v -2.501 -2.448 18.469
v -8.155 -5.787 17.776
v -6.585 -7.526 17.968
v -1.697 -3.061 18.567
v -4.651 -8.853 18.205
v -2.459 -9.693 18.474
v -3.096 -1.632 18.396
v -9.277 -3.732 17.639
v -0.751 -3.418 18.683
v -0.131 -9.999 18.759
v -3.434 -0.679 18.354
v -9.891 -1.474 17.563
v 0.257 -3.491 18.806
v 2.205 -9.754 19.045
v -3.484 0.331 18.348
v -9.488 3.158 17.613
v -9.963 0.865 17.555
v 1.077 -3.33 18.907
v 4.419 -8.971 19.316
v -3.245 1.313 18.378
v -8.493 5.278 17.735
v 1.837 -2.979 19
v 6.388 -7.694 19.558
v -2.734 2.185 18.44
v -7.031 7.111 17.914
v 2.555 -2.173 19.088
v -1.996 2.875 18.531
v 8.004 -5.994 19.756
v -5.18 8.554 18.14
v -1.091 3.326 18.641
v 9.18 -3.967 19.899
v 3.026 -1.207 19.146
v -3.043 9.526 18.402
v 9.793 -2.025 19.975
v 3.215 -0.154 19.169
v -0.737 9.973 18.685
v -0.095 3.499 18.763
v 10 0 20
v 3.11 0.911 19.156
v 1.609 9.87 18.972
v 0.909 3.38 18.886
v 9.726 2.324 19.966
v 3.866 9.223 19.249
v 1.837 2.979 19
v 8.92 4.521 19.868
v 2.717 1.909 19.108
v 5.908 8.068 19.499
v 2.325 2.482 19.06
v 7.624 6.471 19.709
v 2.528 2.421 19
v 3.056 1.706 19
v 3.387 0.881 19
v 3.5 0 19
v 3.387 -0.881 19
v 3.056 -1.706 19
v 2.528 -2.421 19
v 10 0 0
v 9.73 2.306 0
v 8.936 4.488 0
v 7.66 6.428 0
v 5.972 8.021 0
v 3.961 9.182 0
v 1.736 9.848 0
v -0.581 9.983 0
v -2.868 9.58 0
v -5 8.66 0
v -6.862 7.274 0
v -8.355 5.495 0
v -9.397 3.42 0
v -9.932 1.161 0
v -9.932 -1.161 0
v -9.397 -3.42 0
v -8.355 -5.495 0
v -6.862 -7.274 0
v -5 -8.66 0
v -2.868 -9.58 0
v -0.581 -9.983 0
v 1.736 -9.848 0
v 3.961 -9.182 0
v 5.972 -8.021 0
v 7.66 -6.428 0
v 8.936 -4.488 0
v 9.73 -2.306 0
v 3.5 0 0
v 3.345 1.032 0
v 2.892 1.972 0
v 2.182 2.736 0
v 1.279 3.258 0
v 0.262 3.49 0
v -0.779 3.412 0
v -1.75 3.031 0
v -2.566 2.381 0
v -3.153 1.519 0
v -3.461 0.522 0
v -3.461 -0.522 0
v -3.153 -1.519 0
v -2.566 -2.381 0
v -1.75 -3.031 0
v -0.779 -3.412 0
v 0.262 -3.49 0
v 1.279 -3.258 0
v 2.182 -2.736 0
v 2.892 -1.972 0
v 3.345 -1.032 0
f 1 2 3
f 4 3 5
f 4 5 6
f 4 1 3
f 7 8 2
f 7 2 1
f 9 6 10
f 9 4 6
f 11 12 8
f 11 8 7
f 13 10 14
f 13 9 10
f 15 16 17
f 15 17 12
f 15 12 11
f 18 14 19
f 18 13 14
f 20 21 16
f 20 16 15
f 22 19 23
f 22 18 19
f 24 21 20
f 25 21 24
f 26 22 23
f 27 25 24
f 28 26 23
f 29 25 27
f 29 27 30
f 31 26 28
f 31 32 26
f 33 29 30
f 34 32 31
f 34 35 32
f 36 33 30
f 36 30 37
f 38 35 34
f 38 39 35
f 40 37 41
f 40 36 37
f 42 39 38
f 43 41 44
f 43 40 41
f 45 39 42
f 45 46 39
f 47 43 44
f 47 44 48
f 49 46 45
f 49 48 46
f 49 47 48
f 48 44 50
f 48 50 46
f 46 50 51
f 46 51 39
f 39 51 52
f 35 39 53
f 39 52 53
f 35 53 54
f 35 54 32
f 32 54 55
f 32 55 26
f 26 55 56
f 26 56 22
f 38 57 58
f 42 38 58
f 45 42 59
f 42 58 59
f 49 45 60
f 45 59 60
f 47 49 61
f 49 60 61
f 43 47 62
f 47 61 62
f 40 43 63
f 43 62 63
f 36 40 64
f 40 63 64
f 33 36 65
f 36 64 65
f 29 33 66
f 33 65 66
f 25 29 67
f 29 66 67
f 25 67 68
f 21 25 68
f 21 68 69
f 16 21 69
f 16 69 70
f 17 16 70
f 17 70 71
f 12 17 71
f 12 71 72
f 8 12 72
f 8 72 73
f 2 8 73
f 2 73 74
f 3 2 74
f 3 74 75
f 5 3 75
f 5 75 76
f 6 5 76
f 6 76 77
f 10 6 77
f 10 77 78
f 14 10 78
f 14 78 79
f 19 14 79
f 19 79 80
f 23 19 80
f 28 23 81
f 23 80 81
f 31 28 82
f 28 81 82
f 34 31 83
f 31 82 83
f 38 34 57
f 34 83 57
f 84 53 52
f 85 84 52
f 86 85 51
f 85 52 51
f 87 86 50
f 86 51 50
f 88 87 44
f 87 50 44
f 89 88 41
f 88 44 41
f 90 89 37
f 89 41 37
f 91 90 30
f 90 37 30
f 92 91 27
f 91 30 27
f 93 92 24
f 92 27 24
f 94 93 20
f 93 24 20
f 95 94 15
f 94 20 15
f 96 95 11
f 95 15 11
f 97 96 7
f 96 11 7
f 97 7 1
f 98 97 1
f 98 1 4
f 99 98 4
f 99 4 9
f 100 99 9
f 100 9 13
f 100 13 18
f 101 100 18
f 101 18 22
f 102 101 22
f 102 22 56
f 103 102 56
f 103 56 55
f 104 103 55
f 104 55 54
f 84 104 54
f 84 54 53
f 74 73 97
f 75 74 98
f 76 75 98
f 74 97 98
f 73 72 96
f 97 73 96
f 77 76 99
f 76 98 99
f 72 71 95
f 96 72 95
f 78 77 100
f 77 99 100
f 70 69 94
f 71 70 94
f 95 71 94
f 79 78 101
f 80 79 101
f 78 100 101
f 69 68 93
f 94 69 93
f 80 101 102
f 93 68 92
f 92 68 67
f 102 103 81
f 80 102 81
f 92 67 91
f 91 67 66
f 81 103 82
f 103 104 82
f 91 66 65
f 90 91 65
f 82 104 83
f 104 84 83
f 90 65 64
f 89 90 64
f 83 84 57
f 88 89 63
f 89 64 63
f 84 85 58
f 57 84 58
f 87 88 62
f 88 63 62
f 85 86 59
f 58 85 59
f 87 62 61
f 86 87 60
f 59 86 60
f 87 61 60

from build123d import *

# Parameters (mm, degrees)
SKETCH1_R                 = 10
BOSS_EXTRUDE1_DEPTH       = 20
CUT_EXTRUDE1_DEPTH        = 103
M8X1_0_TAPPED_HOLE1_D     = 7
M8X1_0_TAPPED_HOLE1_DEPTH = 19
M8X1_0_TAPPED_HOLE1_TIP   = 2.103012167


with BuildPart() as part:
    # Sketch1 → Boss-Extrude1 (new body)
    with BuildSketch(Plane.XY):
        Circle(SKETCH1_R)
    extrude(amount=BOSS_EXTRUDE1_DEPTH)

    # Sketch2 → Cut-Extrude1 (cut, symmetric)
    with BuildSketch(Plane(origin=(0, 0, 0), x_dir=(1, 0, 0), z_dir=(0, 1, 0))):
        Polygon((-175.190419067, 2.685826336), (24.809580933, -21.814173664), (24.809580933, -148.814173664), (-175.190419067, -173.314173664), align=None)
    extrude(amount=CUT_EXTRUDE1_DEPTH, both=True, mode=Mode.SUBTRACT)

    # M8x1.0 Tapped Hole1
    with Locations(Plane(origin=(0, 0, 0), x_dir=(-1, 0, 0), z_dir=(0, 0, -1))):
        with Locations((0, 0)):
            Hole(M8X1_0_TAPPED_HOLE1_D / 2, depth=M8X1_0_TAPPED_HOLE1_DEPTH)
            with Locations((0, 0, -(M8X1_0_TAPPED_HOLE1_DEPTH + M8X1_0_TAPPED_HOLE1_TIP / 2))):  # 118° drill point
                Cone(0, M8X1_0_TAPPED_HOLE1_D / 2, M8X1_0_TAPPED_HOLE1_TIP, mode=Mode.SUBTRACT)


solid = part.part
